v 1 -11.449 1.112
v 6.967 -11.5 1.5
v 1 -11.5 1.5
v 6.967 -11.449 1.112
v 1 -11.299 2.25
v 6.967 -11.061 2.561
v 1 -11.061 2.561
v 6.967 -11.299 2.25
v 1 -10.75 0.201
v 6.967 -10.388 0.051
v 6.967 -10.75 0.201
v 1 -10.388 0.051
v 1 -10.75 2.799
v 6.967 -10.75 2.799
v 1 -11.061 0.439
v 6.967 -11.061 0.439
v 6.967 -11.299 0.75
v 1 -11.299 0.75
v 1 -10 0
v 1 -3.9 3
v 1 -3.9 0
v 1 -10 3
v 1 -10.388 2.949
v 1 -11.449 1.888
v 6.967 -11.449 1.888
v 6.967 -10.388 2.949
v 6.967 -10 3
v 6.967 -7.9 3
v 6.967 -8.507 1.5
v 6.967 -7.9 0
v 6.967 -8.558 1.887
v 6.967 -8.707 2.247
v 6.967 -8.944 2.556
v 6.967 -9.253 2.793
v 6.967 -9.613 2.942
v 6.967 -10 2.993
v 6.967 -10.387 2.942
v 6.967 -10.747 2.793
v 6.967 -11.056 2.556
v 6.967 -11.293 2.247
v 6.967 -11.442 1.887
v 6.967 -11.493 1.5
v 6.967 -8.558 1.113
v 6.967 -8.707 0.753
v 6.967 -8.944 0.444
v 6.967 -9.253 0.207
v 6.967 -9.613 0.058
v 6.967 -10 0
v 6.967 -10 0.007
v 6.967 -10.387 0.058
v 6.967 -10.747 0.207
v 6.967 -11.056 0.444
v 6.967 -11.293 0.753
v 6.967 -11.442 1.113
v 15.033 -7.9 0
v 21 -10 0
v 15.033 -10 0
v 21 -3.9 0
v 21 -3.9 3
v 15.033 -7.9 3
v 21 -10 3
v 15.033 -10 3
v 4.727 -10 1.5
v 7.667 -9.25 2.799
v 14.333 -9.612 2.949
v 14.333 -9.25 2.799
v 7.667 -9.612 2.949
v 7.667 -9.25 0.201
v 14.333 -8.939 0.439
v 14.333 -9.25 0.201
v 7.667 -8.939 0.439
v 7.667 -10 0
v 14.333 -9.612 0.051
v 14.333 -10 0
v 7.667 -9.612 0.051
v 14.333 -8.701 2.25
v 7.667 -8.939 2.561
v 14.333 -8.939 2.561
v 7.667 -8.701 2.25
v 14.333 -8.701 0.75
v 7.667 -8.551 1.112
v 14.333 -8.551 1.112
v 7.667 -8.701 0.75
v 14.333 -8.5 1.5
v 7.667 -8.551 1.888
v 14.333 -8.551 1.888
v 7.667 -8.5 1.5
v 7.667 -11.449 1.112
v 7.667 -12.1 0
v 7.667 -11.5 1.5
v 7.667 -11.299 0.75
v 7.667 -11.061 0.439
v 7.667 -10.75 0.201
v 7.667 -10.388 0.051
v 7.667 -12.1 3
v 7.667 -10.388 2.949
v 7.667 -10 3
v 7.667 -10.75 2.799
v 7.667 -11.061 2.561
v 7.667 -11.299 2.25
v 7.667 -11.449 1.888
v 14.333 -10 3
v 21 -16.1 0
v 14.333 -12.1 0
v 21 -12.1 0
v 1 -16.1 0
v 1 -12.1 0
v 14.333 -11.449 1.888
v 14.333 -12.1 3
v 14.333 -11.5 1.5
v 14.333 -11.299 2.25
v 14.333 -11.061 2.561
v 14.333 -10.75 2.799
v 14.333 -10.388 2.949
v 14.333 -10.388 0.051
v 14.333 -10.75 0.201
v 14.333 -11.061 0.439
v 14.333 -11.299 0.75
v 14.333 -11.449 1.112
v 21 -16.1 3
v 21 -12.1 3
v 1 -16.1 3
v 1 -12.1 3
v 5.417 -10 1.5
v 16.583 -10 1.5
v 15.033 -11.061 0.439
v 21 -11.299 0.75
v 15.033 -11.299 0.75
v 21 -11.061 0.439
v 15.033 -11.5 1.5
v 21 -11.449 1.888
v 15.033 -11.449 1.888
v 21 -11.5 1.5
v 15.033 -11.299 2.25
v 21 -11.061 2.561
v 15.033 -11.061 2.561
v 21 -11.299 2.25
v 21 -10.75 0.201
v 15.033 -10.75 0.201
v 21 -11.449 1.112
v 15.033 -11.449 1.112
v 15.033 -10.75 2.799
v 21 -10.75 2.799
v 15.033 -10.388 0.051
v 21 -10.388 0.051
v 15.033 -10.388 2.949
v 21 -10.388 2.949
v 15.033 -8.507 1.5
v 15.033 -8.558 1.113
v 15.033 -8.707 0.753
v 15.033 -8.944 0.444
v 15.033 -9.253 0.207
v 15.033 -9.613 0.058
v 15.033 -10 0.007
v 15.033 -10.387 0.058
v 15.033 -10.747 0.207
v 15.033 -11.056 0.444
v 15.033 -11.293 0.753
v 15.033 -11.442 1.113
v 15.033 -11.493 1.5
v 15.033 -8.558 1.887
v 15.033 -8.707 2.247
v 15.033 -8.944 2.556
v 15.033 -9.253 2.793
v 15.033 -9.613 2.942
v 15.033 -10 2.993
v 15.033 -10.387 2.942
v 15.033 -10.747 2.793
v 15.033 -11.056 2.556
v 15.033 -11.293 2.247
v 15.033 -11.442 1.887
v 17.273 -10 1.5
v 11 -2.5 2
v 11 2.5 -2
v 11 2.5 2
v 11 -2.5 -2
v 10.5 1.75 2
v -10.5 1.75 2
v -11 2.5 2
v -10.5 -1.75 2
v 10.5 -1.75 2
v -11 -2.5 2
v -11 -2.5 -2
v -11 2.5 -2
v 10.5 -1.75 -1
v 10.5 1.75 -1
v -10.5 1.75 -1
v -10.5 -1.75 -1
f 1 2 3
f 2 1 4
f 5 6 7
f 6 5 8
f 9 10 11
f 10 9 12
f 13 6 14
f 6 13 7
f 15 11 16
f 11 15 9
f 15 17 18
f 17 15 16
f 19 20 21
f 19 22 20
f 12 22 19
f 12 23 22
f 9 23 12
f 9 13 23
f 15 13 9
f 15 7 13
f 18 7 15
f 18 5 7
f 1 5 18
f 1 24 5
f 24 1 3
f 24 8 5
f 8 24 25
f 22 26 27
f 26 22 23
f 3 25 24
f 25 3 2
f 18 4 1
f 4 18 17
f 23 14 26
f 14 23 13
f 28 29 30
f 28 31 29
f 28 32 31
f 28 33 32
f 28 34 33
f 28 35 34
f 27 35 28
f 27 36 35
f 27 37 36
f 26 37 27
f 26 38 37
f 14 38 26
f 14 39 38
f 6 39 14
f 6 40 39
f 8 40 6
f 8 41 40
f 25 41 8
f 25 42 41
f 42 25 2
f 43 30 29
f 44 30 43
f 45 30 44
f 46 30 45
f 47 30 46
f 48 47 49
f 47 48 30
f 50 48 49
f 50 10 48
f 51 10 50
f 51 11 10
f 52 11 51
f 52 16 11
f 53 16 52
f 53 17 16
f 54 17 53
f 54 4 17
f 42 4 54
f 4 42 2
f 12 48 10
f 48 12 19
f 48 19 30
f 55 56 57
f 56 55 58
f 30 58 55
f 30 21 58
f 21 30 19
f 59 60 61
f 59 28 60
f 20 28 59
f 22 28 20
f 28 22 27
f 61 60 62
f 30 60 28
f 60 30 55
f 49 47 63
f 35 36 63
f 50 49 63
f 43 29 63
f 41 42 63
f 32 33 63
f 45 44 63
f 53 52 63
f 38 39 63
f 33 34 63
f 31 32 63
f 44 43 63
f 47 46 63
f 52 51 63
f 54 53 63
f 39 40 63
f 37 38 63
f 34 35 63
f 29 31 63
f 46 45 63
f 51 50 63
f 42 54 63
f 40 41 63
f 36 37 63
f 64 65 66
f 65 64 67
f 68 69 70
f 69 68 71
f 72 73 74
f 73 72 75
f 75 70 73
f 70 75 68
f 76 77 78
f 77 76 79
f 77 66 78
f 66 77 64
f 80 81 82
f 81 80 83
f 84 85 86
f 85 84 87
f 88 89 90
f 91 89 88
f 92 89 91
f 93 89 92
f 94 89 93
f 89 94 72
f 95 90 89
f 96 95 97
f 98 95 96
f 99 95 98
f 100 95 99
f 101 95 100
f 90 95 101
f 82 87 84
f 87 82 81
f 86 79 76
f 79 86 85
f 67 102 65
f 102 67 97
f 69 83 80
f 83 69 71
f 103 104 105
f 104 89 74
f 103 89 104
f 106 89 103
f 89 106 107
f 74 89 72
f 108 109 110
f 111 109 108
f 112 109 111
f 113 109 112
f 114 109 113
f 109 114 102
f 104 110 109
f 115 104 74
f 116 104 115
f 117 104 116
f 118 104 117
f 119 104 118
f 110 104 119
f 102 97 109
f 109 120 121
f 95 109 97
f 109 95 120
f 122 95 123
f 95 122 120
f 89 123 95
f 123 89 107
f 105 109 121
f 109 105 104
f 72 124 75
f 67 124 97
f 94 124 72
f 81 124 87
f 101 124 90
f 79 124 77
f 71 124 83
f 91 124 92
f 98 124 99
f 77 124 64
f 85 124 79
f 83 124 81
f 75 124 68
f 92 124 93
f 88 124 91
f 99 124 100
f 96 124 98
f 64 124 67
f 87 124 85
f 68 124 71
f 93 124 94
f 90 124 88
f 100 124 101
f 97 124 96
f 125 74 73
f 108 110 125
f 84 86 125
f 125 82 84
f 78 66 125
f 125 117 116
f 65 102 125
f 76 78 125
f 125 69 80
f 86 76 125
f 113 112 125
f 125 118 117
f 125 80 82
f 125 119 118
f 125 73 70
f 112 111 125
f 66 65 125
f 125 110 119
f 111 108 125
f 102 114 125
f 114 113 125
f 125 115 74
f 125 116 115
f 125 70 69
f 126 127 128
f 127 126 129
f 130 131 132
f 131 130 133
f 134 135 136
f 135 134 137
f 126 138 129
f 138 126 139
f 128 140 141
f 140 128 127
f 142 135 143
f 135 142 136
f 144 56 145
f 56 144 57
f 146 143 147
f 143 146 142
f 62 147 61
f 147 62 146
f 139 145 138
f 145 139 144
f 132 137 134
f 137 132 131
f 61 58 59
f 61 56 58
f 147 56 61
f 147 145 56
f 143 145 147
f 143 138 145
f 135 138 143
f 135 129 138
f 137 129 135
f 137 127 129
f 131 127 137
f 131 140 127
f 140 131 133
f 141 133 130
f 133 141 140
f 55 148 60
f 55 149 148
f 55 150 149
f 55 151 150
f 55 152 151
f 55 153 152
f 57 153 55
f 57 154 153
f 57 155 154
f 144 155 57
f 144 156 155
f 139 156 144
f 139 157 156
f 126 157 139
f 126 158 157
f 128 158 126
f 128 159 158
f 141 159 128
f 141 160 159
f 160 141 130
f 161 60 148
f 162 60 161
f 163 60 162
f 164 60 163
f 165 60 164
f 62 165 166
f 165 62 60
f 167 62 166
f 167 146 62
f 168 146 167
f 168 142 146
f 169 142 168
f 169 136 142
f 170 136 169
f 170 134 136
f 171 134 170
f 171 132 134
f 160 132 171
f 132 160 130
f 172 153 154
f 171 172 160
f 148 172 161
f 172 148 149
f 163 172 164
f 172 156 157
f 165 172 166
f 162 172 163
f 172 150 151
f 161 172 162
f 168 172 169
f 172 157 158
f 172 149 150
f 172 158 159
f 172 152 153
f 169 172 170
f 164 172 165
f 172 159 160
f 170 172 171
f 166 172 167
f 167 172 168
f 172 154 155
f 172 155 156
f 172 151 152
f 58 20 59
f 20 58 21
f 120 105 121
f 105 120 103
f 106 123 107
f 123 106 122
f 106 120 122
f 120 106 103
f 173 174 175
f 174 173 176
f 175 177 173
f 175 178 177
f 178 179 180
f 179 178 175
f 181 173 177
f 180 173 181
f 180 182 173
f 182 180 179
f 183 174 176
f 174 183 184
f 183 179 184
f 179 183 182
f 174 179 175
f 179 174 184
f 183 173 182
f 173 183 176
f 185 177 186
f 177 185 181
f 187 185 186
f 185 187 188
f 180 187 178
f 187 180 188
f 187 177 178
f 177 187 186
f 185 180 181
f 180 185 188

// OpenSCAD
// file: mathhinge.scad
module math_hinge(){// mathgrrl cone hinge

//////////////////////////////////////////////////////
// parameters

// Length of the complete hinge
length = 20;

// Height (diameter) of the hinge
height = 3;

// Clearance between cones and holes
clearance = .7;		

// Clearance between hinge and sides
gap = .6; 				

// Parameters that the user does not get to specify
$fn=24*1;
border = 2*1; 
fudge = .01*1;			// to preserve mesh integrity
corner = 0*1;      	// space between hinge and corner
hinge_radius = height/2;
cone_height = 1.5*hinge_radius;  

//////////////////////////////////////////////////////
// renders

rotate(90,[0,1,0]) 
	translate([-hinge_radius,0,0])
		hinge();

translate([0,hinge_radius+gap,0]) bar();
translate([0,-2*border-hinge_radius-gap,0]) bar();

//translate([0,hinge_radius+gap,0]) square();
//translate([0,-length-hinge_radius-gap,0]) square();


//////////////////////////////////////////////////////
// module for hinge

module hinge(){
	rad = hinge_radius;
	clr = clearance;
	len = (length-2*corner)/3; 
	con = cone_height;
	// left outside hinge = (cylinder+box)-cone
	difference(){
		union(){
			translate([0,0,corner]) cylinder(h=len-clr,r=rad);
			translate([-rad,0,corner]) cube([2*rad,rad+gap,len-clr]);
		}
		translate([0,0,corner+len-con-clr+fudge]) cylinder(h=con,r1=0,r2=rad);
	}
	// inside hinge = cylinder+box+cone+cone
	union(){
		translate([0,0,corner+len]) cylinder(h=len,r=rad);
		translate([-rad,-rad-gap,corner+len]) cube([2*rad,rad+gap,len]);
		translate([0,0,corner+len-con]) cylinder(h=con,r1=0,r2=rad);
		translate([0,0,corner+2*len]) cylinder(h=con,r1=rad,r2=0);
	}
	// right outside hinge = (cylinder+box)-cone
	difference(){
		union(){
			translate([0,0,corner+2*len+clr]) cylinder(h=len-clr,r=rad);
			translate([-rad,0,corner+2*len+clr]) cube([2*rad,rad+gap,len-clr]);
		}
		translate([0,0,corner+2*len+clr-fudge]) cylinder(h=con,r1=rad,r2=0);	
	}
}

//////////////////////////////////////////////////////
// module for square shape

module square(){
	difference(){
		cube([length,length,height]);
		translate([border,border,-fudge])
			cube(	[length-2*border,length-2*border,height+2*fudge]);
	}
}

//////////////////////////////////////////////////////
// module for bar shape

module bar(){
	cube([length,2*border,height]);
}
}
math_hinge();
// main file
use <mathhinge.scad>;

module hinge(){
translate([1, -10, 0]) math_hinge();
}

module box(){
	difference(){
		cube([22, 5, 4], center=true);
		translate([0,0,2]) cube([21, 3.5, 6], center=true);
	}
}


hinge();
box();

//for comparison
//translate([0, -5, 0]) cube([20, 4, 3]);
